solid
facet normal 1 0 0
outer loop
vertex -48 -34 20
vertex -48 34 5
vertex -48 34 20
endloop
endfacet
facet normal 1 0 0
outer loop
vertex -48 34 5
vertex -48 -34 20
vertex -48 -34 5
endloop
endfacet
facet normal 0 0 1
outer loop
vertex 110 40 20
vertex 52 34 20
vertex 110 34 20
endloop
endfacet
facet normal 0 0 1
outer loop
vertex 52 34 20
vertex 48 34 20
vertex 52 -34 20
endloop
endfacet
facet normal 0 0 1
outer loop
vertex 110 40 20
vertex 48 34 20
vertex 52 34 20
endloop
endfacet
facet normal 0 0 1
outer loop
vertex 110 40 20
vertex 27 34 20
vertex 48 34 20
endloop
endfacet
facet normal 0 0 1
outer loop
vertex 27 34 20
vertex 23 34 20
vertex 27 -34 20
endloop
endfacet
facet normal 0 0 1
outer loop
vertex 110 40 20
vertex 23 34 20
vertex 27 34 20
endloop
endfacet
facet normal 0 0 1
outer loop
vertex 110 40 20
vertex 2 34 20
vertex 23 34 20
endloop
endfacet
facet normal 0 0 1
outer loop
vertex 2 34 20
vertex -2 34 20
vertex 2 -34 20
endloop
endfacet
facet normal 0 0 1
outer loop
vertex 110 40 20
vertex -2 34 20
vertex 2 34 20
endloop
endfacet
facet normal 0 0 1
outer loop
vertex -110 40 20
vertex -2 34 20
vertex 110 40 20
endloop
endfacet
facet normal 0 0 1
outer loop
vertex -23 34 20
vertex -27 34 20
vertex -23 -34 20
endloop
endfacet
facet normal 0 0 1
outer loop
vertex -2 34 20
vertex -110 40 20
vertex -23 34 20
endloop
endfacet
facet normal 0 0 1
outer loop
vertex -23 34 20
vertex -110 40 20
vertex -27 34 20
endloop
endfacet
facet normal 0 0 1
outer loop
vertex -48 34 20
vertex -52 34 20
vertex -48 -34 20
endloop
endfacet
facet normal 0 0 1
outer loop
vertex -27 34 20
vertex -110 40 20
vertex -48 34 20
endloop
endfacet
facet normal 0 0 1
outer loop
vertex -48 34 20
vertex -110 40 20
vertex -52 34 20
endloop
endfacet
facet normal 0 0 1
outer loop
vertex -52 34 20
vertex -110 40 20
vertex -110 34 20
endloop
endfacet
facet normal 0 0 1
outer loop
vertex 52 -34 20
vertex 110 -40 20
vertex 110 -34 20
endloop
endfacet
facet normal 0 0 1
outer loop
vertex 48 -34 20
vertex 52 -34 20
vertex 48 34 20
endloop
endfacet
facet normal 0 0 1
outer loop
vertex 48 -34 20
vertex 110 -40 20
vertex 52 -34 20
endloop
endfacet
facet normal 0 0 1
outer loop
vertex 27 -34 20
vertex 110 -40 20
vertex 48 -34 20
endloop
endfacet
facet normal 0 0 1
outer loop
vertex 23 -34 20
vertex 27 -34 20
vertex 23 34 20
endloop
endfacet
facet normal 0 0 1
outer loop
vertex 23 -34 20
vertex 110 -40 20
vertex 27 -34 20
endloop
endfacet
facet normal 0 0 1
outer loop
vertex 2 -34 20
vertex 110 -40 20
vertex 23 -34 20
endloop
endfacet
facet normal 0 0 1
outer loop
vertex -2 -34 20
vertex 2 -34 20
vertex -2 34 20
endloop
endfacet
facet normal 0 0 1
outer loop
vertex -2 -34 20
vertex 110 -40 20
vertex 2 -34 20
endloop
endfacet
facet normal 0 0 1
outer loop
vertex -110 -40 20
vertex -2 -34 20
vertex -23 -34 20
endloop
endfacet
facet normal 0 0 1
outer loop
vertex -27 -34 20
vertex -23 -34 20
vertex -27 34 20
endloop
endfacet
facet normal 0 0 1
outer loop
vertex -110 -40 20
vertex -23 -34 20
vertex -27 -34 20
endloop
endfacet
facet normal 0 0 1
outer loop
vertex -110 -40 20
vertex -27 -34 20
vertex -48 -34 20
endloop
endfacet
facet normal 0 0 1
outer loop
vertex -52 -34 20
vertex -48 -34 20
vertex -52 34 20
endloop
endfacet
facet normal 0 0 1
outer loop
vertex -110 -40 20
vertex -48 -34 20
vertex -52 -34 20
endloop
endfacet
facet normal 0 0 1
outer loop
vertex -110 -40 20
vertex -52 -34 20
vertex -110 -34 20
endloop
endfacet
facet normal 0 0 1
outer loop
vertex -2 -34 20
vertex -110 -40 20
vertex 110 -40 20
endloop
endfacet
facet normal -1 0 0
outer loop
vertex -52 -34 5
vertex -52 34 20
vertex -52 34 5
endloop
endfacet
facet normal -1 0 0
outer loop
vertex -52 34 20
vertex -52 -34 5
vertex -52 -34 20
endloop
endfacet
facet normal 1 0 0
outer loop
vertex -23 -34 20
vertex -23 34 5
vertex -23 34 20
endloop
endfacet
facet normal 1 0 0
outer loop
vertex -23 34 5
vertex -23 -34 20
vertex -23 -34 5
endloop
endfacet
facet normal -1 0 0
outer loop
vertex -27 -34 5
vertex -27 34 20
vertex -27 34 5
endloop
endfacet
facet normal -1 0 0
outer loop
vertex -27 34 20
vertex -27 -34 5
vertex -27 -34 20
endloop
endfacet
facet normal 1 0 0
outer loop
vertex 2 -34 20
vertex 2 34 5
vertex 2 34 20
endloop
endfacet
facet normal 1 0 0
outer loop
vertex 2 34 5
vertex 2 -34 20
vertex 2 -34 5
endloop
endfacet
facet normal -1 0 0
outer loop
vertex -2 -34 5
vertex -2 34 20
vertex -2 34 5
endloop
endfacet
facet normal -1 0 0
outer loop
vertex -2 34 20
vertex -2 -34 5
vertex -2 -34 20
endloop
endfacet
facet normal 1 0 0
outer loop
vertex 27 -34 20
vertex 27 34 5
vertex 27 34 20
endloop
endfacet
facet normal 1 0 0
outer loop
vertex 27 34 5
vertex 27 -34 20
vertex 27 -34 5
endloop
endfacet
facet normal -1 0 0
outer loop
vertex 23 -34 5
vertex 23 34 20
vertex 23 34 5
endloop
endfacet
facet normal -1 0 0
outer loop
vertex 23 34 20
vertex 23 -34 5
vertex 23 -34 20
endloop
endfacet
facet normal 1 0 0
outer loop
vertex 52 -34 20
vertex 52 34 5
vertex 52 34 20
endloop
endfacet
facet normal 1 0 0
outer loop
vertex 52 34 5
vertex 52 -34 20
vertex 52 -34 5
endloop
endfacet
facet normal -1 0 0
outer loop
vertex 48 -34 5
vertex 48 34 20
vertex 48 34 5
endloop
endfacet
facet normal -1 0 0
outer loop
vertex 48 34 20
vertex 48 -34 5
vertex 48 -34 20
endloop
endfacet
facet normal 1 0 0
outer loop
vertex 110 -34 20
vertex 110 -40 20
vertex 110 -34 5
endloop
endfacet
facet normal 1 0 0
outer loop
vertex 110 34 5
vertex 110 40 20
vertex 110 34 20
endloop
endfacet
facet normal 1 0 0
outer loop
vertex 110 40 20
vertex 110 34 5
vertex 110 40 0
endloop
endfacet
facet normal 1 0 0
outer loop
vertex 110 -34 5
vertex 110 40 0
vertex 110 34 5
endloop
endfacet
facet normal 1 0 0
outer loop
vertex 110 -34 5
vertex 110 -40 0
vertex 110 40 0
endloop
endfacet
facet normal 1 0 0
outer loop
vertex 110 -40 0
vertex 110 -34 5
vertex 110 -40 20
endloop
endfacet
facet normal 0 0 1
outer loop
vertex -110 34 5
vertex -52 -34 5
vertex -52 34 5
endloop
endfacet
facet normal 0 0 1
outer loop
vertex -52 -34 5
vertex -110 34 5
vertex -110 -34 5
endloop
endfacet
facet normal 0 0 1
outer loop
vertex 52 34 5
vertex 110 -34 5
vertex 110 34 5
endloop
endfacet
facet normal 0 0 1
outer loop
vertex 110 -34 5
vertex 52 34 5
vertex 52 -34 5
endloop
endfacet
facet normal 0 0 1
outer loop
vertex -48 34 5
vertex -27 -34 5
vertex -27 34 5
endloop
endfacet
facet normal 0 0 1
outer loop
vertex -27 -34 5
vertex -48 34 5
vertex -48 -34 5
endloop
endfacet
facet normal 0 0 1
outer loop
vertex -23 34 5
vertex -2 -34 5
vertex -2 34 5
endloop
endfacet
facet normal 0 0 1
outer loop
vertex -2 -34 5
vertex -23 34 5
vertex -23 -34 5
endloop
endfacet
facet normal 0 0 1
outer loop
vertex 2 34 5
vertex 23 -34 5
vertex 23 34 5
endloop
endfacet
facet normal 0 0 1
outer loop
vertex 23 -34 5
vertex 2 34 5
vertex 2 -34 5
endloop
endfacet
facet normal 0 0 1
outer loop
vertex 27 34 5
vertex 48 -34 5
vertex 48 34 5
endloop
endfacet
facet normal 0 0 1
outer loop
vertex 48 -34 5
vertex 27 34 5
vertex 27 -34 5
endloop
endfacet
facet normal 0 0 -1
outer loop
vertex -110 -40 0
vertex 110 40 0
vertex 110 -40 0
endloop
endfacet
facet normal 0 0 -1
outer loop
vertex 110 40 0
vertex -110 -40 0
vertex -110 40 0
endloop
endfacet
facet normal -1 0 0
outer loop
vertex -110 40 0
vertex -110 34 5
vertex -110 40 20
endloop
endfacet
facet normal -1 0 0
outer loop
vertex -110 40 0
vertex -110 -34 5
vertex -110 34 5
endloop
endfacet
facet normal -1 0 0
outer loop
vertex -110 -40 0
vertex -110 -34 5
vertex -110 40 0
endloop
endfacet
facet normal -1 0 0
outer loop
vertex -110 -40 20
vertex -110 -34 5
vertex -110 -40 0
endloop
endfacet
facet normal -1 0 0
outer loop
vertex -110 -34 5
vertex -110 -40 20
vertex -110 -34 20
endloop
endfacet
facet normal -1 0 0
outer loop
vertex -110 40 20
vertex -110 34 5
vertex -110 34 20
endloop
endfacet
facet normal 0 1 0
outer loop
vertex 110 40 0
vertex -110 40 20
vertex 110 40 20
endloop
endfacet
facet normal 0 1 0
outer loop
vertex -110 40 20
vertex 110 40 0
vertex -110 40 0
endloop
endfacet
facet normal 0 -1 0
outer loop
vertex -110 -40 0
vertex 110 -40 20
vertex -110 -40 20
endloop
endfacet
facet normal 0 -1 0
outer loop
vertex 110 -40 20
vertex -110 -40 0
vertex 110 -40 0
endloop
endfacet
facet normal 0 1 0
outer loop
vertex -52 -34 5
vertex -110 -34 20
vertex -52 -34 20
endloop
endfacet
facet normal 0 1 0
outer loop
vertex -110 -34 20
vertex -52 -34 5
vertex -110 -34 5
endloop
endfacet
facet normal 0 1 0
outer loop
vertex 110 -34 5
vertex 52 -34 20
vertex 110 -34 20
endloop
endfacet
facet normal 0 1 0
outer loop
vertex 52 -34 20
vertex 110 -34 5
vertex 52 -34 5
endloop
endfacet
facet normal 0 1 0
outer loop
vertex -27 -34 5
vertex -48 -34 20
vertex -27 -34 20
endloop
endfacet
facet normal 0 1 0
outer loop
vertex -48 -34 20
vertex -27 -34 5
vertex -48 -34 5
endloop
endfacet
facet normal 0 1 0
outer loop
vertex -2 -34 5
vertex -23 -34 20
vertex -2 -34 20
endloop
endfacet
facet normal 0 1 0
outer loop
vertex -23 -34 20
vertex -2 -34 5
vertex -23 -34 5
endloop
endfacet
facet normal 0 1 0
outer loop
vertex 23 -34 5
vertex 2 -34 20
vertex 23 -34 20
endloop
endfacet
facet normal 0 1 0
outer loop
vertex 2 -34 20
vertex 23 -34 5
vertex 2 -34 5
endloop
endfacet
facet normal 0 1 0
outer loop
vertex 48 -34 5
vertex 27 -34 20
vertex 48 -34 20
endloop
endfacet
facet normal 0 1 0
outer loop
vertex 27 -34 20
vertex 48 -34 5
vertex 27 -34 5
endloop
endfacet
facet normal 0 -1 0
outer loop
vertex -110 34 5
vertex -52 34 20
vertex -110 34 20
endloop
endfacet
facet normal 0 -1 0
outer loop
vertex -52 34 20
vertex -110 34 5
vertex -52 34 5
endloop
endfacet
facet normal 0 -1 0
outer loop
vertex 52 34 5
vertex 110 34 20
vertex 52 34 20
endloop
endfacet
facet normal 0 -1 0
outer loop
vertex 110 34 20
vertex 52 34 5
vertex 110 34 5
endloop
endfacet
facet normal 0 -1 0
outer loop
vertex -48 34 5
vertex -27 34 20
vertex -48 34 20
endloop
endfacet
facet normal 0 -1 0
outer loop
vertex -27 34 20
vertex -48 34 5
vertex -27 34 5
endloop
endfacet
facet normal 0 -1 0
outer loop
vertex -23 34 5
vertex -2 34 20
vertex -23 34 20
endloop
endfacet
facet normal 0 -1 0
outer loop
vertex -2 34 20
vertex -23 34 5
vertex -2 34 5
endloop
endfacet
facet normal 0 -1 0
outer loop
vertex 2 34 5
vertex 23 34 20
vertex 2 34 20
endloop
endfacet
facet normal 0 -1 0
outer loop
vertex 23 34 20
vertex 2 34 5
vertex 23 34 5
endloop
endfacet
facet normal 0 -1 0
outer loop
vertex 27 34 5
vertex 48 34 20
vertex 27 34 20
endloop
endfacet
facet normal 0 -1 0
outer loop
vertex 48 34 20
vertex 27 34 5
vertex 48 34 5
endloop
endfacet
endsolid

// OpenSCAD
$fn = 32;

// ----------------------------------------------------------------------
// Rib frame 220 x 80 x 20
// 5 ribs at 25 mm pitch
// ----------------------------------------------------------------------

// --- parameters (mm) ---
frame = [220, 80, 5];  // base plate size (x, y, z)
rail_w = 6;            // side rail width
ribs = 5;              // number of ribs
rib_t = 4;             // rib thickness
rib_h = 15;            // rib height above the base plate
pitch = 25;            // pitch between rib centres

// --- derived feature positions (mm) ---
span = (ribs - 1) * pitch;          // = 100   distance between the outer ribs
origin_x = -span / 2;               // = -50   X of the first rib
rib_len = frame[1] - 2 * rail_w + 2;  // = 70   rib length, 1 mm into each rail
feature_centers = [
  [origin_x + 0 * pitch, 0],
  [origin_x + 1 * pitch, 0],
  [origin_x + 2 * pitch, 0],
  [origin_x + 3 * pitch, 0],
  [origin_x + 4 * pitch, 0]
];   // rib centre line, drives the rib loop

// base plate, two side rails, then the ribs read straight off feature_centers
union() {
  translate([-frame[0] / 2, -frame[1] / 2, 0]) cube(frame);
  translate([-frame[0] / 2, -frame[1] / 2, 0]) cube([frame[0], rail_w, frame[2] + rib_h]);
  translate([-frame[0] / 2, frame[1] / 2 - rail_w, 0]) cube([frame[0], rail_w, frame[2] + rib_h]);
  for (centre = feature_centers)
    translate([centre[0] - rib_t / 2, centre[1] - rib_len / 2, frame[2] - 1])
      cube([rib_t, rib_len, rib_h + 1]);
}
